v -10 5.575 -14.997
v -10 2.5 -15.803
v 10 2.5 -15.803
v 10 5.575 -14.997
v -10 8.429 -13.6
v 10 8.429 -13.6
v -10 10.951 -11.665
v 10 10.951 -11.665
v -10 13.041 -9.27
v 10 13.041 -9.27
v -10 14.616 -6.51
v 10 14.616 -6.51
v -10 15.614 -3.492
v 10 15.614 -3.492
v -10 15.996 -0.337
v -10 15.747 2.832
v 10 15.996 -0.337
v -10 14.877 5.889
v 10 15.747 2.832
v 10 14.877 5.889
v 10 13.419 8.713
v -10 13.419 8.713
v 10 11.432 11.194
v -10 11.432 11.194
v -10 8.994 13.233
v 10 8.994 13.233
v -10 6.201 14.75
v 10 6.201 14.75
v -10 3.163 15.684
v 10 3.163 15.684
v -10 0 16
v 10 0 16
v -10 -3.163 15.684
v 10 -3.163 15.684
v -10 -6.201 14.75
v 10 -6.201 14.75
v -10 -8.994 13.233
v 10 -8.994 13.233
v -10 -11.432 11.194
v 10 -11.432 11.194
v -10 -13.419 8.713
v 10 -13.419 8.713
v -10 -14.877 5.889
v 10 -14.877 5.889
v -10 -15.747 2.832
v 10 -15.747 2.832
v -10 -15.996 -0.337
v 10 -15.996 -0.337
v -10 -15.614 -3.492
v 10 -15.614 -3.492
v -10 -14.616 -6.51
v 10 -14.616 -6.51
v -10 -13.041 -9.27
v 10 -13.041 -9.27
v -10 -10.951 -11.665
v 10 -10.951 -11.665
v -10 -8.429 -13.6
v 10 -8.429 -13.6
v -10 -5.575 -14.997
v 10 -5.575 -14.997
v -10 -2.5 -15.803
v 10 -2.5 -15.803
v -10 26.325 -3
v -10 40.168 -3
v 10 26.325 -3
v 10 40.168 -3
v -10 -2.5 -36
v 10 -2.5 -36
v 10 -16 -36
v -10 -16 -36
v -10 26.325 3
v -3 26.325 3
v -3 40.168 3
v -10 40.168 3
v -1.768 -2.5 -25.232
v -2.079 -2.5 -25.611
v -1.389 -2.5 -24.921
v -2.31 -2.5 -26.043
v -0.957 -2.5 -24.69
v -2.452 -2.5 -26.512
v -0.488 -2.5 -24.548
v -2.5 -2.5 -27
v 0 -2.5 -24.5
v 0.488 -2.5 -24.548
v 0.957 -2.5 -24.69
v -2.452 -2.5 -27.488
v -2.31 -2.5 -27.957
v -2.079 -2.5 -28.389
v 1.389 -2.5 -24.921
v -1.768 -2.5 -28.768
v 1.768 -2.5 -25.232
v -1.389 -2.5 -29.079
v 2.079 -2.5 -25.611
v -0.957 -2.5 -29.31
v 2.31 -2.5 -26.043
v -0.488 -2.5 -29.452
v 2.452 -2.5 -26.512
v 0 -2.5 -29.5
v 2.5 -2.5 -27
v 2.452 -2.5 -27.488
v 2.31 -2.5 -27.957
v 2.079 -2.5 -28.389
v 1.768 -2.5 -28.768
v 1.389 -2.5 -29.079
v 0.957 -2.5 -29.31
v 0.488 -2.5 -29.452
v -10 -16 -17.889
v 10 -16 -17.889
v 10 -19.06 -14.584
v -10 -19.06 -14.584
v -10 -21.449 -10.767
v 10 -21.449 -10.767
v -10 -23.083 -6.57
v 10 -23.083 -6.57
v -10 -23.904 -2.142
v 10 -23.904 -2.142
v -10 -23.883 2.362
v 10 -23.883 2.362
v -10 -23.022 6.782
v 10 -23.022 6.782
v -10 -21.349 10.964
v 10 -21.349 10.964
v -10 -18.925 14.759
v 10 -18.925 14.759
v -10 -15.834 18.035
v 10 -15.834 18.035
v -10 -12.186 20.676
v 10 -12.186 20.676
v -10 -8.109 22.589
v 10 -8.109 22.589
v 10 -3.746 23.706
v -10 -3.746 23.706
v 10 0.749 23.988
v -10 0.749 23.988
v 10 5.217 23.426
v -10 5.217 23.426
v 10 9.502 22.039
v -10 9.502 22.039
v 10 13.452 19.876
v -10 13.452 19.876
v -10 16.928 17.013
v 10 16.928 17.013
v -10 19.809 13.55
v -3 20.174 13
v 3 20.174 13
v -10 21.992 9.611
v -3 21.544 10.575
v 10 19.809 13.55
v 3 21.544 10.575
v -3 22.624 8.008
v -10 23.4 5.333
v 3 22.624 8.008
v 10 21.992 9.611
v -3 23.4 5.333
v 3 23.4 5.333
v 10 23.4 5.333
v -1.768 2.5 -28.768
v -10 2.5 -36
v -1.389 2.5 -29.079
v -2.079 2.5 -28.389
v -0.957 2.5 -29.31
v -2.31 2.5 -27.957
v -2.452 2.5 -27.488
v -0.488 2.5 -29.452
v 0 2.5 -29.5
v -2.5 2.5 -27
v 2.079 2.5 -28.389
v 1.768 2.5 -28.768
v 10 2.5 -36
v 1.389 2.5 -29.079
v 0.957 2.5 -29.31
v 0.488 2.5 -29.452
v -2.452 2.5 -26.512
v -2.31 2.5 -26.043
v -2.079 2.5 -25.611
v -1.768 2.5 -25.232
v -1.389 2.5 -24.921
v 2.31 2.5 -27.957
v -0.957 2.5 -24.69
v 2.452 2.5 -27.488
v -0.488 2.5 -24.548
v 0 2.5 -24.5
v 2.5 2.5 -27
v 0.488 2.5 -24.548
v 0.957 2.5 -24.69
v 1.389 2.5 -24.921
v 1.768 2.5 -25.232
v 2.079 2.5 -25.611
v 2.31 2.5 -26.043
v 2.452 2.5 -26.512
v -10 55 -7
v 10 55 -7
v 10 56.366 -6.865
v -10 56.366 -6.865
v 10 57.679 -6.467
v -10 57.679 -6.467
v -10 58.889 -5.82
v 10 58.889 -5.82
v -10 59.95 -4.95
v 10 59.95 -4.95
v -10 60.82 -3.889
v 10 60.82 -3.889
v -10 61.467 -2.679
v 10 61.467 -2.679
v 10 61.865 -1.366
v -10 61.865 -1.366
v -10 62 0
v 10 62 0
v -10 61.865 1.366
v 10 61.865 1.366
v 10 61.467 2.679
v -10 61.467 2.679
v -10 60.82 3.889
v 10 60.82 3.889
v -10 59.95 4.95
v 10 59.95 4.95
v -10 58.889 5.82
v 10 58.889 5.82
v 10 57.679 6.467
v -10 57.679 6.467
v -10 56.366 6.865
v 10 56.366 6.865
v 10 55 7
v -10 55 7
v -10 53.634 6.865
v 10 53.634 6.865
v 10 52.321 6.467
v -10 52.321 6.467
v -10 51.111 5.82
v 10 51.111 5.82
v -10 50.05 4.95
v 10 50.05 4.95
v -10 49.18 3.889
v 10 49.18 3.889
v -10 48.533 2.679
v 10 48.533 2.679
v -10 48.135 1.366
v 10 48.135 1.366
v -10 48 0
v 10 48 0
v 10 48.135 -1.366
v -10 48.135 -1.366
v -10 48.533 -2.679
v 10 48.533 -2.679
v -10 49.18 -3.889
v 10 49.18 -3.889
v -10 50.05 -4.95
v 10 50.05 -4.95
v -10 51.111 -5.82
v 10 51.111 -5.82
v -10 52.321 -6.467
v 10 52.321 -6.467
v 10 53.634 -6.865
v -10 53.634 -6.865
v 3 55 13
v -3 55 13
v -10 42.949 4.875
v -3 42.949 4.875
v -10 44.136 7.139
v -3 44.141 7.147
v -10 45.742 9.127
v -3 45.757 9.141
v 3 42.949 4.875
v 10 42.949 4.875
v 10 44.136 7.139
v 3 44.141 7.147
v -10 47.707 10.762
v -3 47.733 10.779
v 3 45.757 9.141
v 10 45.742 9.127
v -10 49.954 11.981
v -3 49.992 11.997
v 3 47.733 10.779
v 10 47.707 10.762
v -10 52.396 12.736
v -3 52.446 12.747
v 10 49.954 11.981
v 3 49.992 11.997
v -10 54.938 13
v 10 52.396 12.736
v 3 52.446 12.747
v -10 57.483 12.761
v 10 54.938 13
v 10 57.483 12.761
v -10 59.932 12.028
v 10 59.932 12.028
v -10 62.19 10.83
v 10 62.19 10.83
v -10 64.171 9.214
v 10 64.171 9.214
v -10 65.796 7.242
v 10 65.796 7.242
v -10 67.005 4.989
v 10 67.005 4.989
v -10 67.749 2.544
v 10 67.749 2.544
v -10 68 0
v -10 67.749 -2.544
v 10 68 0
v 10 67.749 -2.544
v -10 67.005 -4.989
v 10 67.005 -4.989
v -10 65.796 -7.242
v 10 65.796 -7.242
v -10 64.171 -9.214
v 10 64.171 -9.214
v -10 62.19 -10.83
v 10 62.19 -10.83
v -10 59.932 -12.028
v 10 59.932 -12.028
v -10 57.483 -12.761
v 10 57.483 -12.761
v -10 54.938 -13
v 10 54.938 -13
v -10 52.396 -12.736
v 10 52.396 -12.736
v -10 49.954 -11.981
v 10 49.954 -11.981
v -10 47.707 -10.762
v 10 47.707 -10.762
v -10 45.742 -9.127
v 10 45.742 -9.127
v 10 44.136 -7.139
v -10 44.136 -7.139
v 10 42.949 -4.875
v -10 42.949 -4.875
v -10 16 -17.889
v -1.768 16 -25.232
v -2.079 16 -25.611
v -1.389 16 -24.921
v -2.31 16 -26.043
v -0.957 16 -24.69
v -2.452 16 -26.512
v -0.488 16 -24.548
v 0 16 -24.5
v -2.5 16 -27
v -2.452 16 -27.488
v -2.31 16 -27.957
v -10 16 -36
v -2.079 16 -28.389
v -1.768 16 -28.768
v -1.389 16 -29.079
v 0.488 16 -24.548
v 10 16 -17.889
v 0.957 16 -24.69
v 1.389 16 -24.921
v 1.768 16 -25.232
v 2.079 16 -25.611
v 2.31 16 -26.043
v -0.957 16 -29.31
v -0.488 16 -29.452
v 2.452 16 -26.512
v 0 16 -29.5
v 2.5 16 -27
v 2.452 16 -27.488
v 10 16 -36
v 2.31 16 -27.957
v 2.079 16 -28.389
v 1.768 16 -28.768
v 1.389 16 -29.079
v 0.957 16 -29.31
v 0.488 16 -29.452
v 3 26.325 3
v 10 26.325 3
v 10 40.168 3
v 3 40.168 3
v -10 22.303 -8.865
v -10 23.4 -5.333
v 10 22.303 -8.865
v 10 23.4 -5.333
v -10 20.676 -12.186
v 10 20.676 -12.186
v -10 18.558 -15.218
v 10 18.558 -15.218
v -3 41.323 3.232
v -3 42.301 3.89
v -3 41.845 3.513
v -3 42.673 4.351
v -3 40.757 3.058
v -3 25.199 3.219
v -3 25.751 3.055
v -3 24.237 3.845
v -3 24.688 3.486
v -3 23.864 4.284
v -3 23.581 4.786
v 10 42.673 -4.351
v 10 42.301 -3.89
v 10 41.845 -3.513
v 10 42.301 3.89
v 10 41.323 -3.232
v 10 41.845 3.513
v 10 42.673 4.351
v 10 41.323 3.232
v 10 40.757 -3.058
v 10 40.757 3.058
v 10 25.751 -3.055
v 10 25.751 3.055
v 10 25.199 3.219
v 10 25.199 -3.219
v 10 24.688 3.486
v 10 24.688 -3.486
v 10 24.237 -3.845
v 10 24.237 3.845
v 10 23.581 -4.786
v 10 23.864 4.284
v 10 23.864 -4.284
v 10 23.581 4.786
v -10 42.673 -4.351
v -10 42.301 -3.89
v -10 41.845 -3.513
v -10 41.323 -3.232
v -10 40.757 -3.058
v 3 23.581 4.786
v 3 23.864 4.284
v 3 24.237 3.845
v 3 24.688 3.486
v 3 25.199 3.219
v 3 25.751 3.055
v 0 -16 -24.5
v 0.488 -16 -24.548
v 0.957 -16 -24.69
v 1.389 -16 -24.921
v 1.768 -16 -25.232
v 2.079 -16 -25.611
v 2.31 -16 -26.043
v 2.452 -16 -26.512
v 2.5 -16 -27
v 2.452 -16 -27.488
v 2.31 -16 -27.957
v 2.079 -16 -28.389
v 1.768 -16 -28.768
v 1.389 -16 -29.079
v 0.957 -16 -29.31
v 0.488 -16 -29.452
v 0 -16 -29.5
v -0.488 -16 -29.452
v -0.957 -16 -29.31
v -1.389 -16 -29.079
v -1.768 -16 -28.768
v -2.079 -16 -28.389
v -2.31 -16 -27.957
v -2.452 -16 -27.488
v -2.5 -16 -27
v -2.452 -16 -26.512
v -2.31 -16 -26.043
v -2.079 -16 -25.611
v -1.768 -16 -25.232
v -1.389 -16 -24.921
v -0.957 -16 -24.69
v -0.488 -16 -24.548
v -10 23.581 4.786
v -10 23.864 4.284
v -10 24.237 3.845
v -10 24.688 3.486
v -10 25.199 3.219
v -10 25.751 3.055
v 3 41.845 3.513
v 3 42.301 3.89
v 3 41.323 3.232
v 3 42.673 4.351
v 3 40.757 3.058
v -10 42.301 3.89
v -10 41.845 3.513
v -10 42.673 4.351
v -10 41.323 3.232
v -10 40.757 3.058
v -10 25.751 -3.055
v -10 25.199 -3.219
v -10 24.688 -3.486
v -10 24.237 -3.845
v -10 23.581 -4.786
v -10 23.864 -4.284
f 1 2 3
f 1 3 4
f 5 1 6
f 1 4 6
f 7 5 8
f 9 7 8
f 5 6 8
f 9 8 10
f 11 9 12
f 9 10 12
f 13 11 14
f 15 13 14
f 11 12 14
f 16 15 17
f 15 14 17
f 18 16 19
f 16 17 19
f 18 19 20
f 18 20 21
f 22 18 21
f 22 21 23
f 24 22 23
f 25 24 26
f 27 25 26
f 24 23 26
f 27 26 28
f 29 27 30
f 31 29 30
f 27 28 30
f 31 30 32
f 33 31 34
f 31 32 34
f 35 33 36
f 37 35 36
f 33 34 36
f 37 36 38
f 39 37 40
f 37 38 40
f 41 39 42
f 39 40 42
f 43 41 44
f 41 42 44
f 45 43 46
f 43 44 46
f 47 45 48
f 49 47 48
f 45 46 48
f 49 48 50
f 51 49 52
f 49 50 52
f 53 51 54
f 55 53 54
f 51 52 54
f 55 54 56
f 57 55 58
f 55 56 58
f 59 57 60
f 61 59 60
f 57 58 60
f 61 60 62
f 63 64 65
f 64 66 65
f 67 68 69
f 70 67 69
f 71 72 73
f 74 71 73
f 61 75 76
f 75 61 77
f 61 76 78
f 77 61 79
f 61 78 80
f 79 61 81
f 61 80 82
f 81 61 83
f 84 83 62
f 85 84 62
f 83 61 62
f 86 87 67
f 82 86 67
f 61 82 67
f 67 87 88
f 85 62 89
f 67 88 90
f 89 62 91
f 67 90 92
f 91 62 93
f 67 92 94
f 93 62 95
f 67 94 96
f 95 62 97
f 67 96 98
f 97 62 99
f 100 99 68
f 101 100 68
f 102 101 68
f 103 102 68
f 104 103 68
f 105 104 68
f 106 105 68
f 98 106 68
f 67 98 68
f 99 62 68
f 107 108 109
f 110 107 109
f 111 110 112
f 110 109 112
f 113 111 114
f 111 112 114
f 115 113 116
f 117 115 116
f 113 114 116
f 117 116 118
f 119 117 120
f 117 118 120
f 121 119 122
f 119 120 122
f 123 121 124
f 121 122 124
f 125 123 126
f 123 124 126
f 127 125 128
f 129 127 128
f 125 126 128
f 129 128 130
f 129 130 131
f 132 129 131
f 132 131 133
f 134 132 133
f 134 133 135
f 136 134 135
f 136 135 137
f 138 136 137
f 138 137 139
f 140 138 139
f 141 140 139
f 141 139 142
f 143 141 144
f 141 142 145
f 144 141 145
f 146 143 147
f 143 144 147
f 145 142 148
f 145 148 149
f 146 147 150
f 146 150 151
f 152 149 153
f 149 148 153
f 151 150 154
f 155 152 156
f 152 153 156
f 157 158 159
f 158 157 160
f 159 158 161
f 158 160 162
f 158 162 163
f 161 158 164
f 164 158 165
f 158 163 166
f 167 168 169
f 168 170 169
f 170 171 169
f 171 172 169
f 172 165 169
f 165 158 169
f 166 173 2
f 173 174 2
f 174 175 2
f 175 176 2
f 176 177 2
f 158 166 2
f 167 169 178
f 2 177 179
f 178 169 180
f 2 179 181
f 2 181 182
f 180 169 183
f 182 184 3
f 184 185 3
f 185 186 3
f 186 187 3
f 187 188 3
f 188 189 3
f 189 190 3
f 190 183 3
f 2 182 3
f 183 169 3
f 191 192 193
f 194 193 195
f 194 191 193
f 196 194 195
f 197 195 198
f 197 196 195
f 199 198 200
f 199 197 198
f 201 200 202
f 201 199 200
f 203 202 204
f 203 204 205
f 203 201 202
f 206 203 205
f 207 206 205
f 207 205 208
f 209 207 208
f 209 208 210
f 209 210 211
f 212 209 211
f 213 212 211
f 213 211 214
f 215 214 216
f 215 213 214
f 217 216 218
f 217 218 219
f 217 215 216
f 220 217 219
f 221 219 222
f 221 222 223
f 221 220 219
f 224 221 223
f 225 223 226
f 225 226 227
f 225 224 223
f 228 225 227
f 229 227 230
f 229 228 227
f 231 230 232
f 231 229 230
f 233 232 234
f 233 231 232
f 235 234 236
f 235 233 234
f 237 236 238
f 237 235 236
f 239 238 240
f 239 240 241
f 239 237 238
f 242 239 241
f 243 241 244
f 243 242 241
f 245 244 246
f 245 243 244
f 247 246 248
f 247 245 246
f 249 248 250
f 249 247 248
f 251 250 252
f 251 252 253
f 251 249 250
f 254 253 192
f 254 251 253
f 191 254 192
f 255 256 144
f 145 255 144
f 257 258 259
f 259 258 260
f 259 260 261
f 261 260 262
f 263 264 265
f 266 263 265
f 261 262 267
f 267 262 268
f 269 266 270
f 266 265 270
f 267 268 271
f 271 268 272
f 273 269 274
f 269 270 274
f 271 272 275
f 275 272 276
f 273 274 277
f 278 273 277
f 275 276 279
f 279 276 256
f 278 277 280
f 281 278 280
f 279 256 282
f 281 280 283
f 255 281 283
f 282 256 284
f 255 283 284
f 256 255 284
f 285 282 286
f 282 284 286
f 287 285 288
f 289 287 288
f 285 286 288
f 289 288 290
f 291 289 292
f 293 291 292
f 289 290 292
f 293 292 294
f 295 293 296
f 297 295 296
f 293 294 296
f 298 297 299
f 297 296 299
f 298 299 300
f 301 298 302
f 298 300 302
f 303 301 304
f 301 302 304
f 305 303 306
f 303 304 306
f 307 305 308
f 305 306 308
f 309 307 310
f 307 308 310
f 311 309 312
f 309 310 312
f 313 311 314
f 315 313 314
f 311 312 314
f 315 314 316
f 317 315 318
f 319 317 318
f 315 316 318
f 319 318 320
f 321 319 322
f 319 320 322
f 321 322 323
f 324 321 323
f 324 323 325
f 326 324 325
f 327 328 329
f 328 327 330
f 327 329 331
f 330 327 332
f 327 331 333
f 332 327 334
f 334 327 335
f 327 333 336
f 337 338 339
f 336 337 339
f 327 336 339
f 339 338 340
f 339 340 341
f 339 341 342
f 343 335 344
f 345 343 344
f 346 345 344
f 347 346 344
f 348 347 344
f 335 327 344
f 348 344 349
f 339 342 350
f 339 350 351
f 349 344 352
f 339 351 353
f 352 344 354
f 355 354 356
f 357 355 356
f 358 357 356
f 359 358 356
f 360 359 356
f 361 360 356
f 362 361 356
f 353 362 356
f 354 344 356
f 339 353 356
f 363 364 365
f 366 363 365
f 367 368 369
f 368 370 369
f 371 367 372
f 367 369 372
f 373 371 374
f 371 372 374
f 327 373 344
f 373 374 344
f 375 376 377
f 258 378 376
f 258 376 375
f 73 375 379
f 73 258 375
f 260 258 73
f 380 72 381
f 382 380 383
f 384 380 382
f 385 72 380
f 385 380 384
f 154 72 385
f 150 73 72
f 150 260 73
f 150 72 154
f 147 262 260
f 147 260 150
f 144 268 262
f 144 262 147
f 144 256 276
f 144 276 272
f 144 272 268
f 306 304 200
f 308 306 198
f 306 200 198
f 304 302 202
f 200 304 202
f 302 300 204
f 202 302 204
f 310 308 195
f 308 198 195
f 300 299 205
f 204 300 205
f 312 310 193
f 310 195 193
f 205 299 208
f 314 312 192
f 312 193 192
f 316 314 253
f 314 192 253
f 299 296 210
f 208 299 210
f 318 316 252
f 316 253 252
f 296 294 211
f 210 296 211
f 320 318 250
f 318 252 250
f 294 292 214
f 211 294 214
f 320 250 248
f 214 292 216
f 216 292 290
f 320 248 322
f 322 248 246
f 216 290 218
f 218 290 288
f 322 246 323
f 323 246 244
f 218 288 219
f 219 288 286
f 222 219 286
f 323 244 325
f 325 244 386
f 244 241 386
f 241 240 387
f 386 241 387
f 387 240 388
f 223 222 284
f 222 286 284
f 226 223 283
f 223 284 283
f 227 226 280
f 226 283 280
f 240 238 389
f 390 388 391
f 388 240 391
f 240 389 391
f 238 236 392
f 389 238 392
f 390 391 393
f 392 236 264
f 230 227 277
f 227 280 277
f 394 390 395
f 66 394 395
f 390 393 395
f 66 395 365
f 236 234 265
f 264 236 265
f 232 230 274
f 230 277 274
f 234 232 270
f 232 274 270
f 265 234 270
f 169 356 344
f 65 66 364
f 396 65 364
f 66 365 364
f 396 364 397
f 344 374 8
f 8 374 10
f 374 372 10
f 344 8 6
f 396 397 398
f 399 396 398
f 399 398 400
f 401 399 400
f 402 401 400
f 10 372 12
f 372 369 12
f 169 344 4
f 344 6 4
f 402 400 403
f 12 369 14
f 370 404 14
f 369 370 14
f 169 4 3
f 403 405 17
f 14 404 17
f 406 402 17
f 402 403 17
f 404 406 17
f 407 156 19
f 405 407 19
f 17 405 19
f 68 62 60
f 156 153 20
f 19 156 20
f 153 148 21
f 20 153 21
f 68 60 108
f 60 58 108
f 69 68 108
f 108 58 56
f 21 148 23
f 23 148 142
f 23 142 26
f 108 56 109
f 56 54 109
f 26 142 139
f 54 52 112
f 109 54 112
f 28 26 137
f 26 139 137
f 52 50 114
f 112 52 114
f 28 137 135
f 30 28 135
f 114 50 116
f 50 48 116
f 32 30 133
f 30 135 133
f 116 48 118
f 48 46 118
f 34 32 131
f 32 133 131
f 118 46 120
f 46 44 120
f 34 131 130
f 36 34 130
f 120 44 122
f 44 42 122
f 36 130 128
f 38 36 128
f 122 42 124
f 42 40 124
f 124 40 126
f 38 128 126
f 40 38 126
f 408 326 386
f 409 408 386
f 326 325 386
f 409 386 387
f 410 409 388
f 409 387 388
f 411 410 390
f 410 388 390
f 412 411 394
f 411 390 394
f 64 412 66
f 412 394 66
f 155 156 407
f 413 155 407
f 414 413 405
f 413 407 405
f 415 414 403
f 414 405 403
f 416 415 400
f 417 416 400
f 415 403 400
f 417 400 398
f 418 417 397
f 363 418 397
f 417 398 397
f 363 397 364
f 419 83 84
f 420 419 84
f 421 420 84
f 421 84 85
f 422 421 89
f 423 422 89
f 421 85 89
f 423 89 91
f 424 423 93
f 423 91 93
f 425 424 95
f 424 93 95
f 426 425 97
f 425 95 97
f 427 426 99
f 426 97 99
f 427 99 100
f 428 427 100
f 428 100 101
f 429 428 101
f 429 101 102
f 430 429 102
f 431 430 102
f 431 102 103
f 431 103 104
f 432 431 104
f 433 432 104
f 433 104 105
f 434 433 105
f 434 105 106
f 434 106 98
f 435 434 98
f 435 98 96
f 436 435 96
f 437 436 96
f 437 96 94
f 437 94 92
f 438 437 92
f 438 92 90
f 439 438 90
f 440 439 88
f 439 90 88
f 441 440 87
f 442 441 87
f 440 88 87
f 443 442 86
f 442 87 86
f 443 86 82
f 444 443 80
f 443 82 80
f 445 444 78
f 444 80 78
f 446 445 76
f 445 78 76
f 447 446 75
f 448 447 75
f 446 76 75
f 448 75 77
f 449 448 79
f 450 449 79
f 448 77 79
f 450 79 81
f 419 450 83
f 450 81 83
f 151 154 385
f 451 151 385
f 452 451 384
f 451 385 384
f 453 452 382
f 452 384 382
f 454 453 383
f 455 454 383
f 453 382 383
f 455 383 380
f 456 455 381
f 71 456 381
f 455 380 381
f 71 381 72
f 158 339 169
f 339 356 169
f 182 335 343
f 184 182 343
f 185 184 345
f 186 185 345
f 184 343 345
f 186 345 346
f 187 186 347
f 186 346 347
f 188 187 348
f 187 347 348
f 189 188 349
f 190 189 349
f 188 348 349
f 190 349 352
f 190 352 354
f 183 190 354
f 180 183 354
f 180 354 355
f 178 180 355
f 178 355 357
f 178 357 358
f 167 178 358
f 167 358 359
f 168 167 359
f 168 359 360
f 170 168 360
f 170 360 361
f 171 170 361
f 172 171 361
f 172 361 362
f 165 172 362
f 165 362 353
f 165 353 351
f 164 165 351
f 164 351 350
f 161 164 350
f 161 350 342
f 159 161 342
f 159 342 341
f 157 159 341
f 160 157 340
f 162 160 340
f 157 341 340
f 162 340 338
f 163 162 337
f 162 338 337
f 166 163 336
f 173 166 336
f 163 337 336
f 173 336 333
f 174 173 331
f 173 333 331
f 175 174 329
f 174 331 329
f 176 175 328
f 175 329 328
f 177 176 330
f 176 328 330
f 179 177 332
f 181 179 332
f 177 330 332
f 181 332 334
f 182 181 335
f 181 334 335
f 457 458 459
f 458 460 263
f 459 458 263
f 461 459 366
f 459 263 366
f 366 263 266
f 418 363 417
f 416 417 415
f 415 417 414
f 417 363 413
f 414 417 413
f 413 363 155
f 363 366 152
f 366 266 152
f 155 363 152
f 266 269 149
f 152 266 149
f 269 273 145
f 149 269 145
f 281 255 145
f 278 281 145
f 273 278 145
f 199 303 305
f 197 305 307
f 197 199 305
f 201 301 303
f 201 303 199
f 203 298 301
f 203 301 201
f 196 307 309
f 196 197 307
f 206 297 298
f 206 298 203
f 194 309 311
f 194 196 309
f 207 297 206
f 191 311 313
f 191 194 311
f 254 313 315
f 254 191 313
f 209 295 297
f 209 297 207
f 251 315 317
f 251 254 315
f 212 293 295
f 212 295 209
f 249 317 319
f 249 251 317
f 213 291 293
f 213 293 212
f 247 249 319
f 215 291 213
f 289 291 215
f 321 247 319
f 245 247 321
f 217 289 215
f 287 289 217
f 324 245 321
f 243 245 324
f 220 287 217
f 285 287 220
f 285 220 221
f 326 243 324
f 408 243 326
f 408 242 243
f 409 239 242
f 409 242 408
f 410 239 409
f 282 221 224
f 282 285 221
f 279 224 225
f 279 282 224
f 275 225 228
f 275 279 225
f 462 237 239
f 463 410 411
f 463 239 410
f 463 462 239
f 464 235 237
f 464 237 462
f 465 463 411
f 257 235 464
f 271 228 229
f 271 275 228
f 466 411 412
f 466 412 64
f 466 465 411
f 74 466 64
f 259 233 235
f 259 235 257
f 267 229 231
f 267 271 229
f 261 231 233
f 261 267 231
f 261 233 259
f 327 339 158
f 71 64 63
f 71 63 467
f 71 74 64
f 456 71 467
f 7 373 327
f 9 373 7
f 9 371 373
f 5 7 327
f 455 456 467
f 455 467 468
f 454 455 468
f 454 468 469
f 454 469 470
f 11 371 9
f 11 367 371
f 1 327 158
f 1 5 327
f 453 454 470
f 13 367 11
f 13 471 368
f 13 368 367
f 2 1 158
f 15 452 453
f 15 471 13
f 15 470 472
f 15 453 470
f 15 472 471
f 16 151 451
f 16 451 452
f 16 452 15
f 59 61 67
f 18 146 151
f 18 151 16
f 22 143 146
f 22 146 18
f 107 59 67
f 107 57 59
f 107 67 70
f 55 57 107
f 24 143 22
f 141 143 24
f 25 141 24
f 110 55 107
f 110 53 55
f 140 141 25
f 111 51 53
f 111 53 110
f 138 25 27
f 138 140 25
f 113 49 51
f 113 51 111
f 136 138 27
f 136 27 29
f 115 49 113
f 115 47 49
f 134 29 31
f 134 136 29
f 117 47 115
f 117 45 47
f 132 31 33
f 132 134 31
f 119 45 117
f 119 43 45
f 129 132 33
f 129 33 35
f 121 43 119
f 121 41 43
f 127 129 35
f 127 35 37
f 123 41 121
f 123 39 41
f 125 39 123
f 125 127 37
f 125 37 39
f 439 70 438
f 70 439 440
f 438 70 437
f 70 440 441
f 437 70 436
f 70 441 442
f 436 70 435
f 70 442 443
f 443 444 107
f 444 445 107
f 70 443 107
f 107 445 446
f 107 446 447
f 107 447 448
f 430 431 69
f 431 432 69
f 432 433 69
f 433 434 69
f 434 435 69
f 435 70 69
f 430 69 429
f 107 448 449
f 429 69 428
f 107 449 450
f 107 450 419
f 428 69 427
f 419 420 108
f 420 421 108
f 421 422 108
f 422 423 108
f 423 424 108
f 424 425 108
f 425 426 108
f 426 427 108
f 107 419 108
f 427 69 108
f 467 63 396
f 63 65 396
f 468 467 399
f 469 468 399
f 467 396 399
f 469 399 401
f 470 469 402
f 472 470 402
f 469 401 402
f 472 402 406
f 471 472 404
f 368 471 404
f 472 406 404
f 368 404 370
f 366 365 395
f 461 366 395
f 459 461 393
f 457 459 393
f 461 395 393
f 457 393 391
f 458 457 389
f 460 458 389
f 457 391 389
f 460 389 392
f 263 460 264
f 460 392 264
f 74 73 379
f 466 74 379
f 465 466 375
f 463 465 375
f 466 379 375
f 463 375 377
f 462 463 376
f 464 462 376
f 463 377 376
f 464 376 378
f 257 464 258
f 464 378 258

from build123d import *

# Parameters (mm, degrees)
SKETCH1_R           = 7
BOSS_EXTRUDE1_DEPTH = 10
RIB1_REACH          = 79.589
SKETCH2_WALL_W      = 192.003076928
SKETCH2_WALL_H      = 6
SKETCH3_R           = 2.5
CUT_EXTRUDE1_DEPTH  = 65.031242374


with BuildPart() as part:
    # Sketch1 → Boss-Extrude1 (new, symmetric)
    with BuildSketch(Plane.YZ):
        with BuildLine():
            Line((26.324893162, 3), (40.167603026, 3))
            ThreePointArc((40.167603026, 3), (41.844654009, 3.512531407), (42.948677458, 4.875))
            ThreePointArc((42.948677458, 4.875), (68, 0), (42.948677458, -4.875))
            ThreePointArc((42.948677458, -4.875), (41.844654009, -3.512531407), (40.167603026, -3))
            Line((40.167603026, -3), (26.324893162, -3))
            ThreePointArc((26.324893162, -3), (24.454064469, -3.65479212), (23.399905033, -5.333333333))
            ThreePointArc((23.399905033, -5.333333333), (20.675987443, -12.186202988), (16, -17.88854382))
            Line((16, -17.88854382), (16, -36))
            Line((16, -36), (2.5, -36))
            Line((2.5, -36), (2.5, -15.803480629))
            ThreePointArc((2.5, -15.803480629), (0, 16), (-2.5, -15.803480629))
            Line((-2.5, -15.803480629), (-2.5, -36))
            Line((-2.5, -36), (-16, -36))
            Line((-16, -36), (-16, -17.88854382))
            ThreePointArc((-16, -17.88854382), (-12.186202988, 20.675987443), (23.399905033, 5.333333333))
            ThreePointArc((23.399905033, 5.333333333), (24.454064469, 3.65479212), (26.324893162, 3))
        make_face()
        with Locations(Location((55, 0, 0), (0, 0, 270))):
            Circle(SKETCH1_R, mode=Mode.SUBTRACT)
    extrude(amount=BOSS_EXTRUDE1_DEPTH, both=True)

    # Sketch2 wall → Rib1 (add, up to next)
    with BuildSketch(Plane(origin=(0, 37.587120501, 13), x_dir=(0, -1, 0), z_dir=(0, 0, -1)), mode=Mode.PRIVATE) as rib1_sk1:
        Rectangle(SKETCH2_WALL_W, SKETCH2_WALL_H)
    rib1_tool1 = extrude(rib1_sk1.sketch, amount=RIB1_REACH, mode=Mode.PRIVATE) - part.part
    add(rib1_tool1.solids().sort_by_distance((0, 37.587120501, 13))[0])

    # Sketch3 → Cut-Extrude1 (cut, through all)
    with BuildSketch(Plane(origin=(0, 16, 0), x_dir=(-1, 0, 0), z_dir=(0, 1, 0))):
        with Locations(Location((0, -27, 0), (0, 0, 90))):
            Circle(SKETCH3_R)
    extrude(amount=-CUT_EXTRUDE1_DEPTH, mode=Mode.SUBTRACT)


solid = part.part
